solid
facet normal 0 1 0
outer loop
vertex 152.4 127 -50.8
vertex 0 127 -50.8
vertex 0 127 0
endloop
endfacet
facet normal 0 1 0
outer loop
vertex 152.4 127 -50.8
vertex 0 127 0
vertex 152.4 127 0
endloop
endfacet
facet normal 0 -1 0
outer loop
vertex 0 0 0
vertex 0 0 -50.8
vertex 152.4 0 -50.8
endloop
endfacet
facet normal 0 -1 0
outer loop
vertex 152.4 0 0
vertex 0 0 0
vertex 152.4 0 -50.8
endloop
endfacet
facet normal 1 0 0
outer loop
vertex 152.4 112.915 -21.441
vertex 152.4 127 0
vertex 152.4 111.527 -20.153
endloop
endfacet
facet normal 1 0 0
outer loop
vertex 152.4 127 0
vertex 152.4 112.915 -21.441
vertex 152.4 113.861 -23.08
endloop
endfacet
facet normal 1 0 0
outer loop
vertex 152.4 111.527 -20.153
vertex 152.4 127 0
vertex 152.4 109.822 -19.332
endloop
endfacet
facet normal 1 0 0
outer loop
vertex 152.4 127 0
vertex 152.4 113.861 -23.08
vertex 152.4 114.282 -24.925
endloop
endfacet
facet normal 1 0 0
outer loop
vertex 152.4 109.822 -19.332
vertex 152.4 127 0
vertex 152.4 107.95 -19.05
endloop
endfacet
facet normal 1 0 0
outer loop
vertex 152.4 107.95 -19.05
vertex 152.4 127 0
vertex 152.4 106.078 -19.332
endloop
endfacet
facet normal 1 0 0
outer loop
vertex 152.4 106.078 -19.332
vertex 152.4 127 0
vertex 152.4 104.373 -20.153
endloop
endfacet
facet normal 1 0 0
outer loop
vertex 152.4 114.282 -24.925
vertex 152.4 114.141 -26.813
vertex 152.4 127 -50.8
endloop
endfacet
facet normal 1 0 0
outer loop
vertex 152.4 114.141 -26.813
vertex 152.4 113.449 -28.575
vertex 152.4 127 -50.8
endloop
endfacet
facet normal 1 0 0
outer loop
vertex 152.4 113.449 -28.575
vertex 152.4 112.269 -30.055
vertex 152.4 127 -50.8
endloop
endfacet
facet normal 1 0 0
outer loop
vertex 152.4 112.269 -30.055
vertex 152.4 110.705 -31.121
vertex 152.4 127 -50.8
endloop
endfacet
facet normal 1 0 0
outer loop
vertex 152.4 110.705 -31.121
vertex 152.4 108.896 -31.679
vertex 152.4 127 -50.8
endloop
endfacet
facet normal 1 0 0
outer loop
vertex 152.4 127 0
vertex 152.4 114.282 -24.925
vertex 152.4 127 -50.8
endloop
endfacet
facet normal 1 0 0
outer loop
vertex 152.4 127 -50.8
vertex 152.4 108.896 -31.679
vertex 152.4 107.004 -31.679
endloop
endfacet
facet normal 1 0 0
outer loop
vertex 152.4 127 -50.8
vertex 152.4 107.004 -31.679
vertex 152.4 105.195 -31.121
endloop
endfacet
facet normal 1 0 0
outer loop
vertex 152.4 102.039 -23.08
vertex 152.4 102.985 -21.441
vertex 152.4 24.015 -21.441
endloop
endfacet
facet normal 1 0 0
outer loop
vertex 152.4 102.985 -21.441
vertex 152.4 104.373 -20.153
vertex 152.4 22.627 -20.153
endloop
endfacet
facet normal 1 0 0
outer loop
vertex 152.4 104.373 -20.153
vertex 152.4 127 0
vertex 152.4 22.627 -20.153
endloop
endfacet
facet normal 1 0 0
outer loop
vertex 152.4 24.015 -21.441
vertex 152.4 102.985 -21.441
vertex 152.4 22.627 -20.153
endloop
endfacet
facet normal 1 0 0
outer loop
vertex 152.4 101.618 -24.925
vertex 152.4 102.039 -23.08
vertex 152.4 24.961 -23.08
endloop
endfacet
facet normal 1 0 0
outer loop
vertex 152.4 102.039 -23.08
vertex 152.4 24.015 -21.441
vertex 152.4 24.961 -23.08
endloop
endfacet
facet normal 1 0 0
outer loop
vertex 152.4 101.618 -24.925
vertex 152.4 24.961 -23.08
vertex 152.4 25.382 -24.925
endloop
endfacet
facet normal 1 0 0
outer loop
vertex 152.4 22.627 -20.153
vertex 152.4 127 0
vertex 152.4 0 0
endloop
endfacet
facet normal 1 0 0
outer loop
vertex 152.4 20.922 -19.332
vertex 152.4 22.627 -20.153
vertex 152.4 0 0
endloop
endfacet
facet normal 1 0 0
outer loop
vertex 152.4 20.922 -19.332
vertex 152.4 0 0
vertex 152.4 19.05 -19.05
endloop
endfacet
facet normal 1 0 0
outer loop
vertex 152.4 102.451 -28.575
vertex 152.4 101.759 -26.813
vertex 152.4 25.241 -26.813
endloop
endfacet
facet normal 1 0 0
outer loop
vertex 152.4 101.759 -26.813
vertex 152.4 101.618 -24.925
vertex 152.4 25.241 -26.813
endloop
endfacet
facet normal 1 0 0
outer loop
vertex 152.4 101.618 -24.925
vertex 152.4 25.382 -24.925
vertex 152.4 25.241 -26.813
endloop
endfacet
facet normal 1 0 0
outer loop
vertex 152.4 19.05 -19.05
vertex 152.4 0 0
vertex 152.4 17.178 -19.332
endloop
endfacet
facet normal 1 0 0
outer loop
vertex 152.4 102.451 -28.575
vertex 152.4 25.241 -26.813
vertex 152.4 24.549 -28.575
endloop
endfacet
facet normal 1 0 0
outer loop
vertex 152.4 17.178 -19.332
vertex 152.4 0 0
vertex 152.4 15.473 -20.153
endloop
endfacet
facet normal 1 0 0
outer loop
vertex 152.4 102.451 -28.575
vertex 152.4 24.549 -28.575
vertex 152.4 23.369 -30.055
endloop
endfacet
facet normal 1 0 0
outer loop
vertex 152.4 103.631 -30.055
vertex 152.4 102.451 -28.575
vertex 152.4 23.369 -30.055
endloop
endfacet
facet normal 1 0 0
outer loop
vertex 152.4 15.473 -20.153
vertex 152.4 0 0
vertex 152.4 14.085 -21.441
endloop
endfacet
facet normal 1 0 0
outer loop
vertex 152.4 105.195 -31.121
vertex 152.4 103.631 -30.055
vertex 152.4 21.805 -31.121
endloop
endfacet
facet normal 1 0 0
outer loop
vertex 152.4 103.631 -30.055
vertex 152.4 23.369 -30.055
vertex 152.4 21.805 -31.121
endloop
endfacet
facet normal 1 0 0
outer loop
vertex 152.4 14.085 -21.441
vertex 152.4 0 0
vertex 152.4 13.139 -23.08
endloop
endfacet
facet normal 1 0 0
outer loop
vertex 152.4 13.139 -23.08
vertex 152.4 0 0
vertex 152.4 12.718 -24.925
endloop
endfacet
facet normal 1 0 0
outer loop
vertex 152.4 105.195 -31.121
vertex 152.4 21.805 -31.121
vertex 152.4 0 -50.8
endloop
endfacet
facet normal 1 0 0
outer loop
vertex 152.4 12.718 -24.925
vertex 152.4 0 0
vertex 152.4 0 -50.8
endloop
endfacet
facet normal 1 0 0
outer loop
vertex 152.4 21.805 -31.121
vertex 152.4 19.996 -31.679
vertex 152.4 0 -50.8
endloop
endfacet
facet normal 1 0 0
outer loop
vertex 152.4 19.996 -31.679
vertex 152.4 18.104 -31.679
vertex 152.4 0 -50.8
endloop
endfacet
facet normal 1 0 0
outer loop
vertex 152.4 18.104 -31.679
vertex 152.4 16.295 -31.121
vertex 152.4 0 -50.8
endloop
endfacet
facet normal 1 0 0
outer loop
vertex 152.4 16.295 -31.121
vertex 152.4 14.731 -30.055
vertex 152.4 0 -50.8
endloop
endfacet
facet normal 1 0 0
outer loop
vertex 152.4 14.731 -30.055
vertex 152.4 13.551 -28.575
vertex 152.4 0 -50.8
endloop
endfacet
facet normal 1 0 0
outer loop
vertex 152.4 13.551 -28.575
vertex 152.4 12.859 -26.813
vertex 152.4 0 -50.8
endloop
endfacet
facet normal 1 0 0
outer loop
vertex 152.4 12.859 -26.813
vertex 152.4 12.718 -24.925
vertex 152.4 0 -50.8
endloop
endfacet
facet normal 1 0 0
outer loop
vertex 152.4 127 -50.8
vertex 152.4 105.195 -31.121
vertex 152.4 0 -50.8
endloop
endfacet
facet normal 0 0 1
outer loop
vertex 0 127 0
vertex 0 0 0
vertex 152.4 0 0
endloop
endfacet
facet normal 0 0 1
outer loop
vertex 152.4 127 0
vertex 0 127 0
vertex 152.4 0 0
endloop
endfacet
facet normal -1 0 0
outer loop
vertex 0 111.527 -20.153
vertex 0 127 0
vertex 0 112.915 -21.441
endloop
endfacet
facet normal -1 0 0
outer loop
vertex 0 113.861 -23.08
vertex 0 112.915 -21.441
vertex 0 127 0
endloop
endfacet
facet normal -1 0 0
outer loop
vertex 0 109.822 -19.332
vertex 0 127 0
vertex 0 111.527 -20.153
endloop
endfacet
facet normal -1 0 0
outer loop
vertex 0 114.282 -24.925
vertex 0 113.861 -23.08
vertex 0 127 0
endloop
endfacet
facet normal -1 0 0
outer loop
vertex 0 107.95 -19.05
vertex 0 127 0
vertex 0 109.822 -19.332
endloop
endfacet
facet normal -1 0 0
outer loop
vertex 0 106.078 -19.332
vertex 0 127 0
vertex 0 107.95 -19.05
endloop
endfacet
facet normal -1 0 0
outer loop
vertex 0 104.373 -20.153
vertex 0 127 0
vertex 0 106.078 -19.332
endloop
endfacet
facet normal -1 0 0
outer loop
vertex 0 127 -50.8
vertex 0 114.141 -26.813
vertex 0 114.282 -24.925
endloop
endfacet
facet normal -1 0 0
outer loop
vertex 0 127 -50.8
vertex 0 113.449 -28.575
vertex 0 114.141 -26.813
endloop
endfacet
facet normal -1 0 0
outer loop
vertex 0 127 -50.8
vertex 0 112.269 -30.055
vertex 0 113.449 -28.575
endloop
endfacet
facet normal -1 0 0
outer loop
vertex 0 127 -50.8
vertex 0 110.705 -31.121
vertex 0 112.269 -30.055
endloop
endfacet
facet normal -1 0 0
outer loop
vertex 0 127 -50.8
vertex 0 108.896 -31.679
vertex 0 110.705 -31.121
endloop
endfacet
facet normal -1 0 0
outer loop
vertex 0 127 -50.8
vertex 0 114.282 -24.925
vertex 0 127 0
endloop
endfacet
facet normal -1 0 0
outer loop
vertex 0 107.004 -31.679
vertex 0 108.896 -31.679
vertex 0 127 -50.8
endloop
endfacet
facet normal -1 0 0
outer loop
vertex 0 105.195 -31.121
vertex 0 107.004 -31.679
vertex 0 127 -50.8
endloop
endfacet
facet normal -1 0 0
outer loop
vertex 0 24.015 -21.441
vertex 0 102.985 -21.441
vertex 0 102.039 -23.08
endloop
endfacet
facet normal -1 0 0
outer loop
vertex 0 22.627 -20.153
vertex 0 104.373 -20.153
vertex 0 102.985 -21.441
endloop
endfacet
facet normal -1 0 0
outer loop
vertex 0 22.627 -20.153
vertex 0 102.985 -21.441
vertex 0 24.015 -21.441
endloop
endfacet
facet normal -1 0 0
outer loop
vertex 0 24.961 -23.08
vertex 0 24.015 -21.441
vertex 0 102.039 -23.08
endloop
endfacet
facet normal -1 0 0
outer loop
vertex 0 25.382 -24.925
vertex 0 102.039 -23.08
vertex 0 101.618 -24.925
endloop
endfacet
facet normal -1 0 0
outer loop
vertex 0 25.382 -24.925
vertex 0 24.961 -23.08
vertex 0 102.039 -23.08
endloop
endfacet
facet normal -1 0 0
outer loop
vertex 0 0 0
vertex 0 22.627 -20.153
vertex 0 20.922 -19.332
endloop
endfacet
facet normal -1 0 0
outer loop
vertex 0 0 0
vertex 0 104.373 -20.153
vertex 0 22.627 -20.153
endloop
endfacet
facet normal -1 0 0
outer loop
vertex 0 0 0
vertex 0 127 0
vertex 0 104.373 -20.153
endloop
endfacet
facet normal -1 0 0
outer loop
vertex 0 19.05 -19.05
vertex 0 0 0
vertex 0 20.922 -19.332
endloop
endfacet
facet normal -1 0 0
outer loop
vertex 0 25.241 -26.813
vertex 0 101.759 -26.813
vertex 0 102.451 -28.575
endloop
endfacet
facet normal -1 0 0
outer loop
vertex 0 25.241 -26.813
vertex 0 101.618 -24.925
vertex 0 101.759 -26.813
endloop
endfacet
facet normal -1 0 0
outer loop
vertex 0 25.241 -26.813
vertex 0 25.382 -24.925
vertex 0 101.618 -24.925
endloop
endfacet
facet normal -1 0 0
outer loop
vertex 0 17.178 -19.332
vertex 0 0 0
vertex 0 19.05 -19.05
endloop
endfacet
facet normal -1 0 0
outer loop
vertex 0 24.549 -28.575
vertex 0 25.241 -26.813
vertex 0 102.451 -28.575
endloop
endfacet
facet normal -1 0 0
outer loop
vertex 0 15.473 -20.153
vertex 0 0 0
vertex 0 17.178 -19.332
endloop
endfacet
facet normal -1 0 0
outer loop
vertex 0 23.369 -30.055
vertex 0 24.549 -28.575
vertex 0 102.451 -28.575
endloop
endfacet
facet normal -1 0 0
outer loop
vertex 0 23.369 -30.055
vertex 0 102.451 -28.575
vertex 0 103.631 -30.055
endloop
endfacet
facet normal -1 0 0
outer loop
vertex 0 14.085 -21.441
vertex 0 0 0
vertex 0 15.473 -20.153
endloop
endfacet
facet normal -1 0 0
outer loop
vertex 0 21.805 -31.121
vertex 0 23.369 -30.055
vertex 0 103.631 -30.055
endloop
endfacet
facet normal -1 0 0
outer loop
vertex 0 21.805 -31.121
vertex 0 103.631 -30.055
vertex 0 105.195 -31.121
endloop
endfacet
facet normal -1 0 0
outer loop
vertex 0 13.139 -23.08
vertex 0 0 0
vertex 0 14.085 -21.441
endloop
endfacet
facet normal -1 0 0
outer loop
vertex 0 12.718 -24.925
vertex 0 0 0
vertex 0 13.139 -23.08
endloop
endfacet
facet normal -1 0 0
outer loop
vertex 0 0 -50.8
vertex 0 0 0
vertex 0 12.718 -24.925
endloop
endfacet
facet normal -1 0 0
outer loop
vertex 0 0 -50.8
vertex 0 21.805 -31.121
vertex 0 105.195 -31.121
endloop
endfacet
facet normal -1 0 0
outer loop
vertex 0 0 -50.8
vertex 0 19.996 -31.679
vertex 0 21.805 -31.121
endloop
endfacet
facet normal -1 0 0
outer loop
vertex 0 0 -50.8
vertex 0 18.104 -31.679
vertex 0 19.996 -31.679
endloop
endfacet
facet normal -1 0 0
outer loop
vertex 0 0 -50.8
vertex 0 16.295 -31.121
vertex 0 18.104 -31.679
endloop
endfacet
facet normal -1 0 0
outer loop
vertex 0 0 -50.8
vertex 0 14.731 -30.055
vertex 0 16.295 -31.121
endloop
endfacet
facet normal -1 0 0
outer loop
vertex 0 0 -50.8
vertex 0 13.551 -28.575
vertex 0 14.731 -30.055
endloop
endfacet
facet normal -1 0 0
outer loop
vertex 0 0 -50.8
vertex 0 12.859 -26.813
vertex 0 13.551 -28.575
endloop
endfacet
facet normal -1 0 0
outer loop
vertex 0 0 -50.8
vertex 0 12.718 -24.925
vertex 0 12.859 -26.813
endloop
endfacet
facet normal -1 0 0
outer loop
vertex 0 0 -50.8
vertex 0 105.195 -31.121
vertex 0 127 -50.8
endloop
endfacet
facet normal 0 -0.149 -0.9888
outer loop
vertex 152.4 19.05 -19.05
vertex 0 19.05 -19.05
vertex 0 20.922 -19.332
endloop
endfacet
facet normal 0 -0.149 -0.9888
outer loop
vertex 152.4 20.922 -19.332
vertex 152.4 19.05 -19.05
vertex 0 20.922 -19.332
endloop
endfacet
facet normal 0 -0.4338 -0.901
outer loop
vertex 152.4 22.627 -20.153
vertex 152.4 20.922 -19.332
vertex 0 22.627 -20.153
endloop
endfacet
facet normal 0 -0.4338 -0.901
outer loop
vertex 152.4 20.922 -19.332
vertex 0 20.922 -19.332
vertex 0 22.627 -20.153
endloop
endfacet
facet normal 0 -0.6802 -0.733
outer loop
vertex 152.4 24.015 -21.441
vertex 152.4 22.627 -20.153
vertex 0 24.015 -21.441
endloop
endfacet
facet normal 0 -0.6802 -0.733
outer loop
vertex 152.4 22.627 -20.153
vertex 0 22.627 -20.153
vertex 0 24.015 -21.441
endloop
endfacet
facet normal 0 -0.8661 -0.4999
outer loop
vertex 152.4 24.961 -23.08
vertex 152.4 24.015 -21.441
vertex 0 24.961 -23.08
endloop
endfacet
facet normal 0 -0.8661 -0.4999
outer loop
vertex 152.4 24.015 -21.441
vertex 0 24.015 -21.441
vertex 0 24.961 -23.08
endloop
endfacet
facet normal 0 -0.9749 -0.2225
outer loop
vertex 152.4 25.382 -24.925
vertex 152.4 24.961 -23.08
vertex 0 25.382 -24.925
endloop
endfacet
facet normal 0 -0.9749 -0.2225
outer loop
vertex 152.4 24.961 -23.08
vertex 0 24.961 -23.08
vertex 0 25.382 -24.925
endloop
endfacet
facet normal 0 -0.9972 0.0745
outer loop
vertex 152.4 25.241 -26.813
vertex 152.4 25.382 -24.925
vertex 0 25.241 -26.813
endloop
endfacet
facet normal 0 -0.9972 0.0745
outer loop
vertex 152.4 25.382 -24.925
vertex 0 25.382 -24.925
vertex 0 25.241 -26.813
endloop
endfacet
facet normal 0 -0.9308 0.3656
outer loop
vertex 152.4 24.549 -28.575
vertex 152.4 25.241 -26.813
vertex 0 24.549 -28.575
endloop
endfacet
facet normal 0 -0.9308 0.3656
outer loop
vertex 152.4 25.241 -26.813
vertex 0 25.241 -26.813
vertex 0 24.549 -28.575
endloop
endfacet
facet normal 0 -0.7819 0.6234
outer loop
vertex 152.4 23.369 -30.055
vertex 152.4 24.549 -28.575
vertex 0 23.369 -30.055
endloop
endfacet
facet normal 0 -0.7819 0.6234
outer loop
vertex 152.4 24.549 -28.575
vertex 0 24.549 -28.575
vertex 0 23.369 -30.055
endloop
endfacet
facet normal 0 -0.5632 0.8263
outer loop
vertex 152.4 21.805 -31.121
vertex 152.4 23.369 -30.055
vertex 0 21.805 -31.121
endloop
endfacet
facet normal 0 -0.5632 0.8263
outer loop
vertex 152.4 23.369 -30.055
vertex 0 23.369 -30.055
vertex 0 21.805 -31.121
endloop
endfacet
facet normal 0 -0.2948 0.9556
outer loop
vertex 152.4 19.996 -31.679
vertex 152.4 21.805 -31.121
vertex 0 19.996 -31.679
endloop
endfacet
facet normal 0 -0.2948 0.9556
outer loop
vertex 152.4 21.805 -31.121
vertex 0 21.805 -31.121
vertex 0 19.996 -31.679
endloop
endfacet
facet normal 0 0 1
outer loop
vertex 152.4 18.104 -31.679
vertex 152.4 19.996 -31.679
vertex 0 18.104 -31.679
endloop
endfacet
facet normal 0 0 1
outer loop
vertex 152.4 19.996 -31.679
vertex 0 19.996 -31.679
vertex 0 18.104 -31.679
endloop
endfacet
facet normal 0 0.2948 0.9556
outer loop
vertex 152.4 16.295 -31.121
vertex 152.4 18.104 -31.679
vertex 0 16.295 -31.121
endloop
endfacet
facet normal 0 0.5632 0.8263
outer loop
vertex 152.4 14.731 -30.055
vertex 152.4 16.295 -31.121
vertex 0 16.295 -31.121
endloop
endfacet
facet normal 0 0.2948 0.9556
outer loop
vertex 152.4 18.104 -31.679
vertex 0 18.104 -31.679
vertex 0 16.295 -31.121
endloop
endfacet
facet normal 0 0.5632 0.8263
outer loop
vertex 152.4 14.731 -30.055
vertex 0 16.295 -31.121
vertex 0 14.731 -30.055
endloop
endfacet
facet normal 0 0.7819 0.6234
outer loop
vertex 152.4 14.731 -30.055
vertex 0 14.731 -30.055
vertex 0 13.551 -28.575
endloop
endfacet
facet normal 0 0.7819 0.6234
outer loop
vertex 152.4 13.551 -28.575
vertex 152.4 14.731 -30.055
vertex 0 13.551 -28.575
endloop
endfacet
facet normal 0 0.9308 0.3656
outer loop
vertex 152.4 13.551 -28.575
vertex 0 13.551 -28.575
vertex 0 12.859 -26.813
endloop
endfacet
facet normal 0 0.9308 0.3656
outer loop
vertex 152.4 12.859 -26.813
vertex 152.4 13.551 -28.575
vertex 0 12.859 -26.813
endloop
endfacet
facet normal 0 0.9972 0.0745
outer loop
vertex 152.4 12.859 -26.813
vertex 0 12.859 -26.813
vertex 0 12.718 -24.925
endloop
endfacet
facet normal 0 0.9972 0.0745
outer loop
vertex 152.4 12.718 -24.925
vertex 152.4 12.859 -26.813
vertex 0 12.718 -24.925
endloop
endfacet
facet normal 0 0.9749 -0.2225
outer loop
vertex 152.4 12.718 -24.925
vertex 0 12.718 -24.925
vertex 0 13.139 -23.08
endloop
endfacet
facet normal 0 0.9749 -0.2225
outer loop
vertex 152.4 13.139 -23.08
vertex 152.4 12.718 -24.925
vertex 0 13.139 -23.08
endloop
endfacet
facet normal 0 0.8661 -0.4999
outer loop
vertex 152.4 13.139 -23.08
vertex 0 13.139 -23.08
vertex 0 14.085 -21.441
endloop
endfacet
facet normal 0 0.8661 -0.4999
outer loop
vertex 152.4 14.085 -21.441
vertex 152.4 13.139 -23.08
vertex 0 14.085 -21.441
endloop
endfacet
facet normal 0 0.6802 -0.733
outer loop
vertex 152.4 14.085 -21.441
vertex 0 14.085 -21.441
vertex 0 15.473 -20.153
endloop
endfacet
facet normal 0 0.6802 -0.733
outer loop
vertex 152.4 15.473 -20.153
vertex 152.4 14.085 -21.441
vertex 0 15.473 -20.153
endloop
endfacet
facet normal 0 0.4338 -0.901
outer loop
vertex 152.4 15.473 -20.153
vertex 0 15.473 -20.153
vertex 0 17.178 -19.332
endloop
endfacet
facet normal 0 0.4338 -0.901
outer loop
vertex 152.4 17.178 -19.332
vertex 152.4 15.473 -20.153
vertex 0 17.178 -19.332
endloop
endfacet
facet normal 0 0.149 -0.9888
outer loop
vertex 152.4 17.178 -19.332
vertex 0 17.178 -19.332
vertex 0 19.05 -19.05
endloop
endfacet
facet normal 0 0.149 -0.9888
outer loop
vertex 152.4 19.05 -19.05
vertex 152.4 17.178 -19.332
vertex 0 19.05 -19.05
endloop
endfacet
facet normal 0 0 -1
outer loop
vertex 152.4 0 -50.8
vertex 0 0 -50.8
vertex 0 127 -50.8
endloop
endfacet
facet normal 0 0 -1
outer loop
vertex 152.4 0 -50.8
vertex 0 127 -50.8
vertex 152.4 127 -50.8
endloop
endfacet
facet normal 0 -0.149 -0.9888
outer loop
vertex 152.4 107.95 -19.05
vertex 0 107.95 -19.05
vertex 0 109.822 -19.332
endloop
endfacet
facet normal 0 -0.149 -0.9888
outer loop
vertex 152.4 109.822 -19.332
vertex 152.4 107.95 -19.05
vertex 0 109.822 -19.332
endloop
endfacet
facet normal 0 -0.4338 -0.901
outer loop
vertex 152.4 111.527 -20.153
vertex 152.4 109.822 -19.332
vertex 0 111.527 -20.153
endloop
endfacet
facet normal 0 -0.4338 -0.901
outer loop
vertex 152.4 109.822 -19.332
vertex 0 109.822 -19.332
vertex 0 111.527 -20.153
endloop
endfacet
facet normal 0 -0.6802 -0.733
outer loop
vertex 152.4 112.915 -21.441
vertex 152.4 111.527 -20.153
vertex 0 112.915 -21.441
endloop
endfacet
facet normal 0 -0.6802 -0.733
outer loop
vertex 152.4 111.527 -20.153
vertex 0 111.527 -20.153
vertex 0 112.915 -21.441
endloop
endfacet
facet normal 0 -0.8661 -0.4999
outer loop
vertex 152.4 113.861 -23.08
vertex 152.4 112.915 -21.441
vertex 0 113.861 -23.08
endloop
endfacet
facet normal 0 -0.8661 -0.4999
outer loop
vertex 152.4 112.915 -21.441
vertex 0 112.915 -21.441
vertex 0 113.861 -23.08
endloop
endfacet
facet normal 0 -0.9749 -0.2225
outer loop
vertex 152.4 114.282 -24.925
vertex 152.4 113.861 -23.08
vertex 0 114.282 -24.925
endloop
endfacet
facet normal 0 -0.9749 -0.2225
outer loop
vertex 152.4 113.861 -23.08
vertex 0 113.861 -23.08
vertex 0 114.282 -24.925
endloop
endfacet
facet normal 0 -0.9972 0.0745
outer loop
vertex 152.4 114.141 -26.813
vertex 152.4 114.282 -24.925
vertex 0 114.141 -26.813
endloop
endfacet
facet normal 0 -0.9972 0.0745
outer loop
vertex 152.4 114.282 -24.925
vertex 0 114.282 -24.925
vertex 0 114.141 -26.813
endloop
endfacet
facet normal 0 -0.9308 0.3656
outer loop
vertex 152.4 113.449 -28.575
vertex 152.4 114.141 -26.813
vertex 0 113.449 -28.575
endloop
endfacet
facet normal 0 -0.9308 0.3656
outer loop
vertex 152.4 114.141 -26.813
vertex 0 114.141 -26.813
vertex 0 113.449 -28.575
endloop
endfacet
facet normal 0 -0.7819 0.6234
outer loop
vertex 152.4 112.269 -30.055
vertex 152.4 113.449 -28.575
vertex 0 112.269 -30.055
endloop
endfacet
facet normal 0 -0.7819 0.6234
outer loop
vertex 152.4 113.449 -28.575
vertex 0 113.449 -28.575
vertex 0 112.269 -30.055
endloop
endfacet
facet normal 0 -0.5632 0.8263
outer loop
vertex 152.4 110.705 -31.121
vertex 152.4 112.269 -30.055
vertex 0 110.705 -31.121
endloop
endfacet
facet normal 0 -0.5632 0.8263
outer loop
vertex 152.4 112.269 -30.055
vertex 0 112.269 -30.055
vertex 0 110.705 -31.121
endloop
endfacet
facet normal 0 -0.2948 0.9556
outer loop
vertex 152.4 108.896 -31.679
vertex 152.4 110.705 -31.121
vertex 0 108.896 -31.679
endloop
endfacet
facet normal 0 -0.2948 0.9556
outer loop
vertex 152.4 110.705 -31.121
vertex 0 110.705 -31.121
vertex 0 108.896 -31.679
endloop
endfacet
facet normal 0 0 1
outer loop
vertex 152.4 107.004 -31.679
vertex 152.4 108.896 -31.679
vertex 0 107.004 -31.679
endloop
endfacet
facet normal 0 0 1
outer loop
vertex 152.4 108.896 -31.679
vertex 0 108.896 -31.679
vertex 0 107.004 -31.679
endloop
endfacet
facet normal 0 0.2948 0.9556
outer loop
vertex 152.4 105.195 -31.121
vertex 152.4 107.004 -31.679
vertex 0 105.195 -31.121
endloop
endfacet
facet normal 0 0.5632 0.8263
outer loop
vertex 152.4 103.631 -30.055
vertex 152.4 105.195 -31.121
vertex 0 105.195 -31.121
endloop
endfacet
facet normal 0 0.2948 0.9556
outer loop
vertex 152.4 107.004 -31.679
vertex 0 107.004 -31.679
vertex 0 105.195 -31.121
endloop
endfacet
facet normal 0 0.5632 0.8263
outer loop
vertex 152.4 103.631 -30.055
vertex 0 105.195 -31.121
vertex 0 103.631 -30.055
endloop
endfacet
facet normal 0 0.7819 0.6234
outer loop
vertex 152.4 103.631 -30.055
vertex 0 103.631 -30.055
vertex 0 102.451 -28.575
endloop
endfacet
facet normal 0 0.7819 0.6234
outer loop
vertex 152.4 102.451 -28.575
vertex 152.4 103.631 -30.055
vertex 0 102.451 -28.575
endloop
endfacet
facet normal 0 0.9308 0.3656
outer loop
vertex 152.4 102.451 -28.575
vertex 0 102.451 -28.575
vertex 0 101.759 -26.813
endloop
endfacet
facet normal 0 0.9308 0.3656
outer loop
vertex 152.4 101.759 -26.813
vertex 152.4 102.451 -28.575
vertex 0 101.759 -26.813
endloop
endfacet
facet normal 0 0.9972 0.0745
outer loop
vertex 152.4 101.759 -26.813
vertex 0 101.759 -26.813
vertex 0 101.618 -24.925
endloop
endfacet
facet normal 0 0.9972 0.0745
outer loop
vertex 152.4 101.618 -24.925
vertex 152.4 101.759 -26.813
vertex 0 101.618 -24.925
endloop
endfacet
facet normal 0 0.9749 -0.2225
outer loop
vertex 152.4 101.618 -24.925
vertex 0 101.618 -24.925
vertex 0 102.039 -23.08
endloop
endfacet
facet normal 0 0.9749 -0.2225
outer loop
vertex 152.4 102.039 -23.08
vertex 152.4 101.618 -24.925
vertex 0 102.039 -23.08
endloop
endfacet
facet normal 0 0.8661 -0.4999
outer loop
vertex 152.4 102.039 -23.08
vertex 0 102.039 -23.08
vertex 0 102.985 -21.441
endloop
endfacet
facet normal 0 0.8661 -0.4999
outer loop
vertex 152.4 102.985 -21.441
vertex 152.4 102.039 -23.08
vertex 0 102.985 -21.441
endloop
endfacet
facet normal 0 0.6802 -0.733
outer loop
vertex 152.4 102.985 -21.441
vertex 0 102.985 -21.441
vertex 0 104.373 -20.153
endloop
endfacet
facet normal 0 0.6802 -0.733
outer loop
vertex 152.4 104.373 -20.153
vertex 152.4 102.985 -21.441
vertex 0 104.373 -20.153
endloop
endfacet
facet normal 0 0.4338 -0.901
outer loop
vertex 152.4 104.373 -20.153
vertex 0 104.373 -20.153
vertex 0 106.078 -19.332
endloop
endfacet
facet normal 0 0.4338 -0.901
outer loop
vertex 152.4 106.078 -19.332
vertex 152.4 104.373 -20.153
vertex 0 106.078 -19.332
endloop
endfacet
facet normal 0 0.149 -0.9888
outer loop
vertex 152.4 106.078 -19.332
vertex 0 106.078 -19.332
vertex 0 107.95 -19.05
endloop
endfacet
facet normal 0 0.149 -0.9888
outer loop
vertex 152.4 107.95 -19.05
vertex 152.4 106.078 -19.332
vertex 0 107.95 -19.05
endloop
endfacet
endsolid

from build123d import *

# Parameters (mm, degrees)
SKETCH1_W           = 152.4
SKETCH1_H           = 50.8
BOSS_EXTRUDE1_DEPTH = 127
SKETCH3_R           = 6.35
CUT_EXTRUDE1_DEPTH  = 153.4


with BuildPart() as part:
    # Sketch1 → Boss-Extrude1 (new body)
    with BuildSketch(Plane(origin=(0, 0, 0), x_dir=(1, 0, 0), z_dir=(0, 1, 0))):
        with Locations((76.2, 25.4)):
            Rectangle(SKETCH1_W, SKETCH1_H)
    extrude(amount=BOSS_EXTRUDE1_DEPTH)

    # Sketch3 → Cut-Extrude1 (cut, through all)
    with BuildSketch(Plane.ZY):
        with Locations((-25.4, 19.05)):
            Circle(SKETCH3_R)
        with Locations((-25.4, 107.95)):
            Circle(SKETCH3_R)
    extrude(amount=-CUT_EXTRUDE1_DEPTH, mode=Mode.SUBTRACT)


solid = part.part
